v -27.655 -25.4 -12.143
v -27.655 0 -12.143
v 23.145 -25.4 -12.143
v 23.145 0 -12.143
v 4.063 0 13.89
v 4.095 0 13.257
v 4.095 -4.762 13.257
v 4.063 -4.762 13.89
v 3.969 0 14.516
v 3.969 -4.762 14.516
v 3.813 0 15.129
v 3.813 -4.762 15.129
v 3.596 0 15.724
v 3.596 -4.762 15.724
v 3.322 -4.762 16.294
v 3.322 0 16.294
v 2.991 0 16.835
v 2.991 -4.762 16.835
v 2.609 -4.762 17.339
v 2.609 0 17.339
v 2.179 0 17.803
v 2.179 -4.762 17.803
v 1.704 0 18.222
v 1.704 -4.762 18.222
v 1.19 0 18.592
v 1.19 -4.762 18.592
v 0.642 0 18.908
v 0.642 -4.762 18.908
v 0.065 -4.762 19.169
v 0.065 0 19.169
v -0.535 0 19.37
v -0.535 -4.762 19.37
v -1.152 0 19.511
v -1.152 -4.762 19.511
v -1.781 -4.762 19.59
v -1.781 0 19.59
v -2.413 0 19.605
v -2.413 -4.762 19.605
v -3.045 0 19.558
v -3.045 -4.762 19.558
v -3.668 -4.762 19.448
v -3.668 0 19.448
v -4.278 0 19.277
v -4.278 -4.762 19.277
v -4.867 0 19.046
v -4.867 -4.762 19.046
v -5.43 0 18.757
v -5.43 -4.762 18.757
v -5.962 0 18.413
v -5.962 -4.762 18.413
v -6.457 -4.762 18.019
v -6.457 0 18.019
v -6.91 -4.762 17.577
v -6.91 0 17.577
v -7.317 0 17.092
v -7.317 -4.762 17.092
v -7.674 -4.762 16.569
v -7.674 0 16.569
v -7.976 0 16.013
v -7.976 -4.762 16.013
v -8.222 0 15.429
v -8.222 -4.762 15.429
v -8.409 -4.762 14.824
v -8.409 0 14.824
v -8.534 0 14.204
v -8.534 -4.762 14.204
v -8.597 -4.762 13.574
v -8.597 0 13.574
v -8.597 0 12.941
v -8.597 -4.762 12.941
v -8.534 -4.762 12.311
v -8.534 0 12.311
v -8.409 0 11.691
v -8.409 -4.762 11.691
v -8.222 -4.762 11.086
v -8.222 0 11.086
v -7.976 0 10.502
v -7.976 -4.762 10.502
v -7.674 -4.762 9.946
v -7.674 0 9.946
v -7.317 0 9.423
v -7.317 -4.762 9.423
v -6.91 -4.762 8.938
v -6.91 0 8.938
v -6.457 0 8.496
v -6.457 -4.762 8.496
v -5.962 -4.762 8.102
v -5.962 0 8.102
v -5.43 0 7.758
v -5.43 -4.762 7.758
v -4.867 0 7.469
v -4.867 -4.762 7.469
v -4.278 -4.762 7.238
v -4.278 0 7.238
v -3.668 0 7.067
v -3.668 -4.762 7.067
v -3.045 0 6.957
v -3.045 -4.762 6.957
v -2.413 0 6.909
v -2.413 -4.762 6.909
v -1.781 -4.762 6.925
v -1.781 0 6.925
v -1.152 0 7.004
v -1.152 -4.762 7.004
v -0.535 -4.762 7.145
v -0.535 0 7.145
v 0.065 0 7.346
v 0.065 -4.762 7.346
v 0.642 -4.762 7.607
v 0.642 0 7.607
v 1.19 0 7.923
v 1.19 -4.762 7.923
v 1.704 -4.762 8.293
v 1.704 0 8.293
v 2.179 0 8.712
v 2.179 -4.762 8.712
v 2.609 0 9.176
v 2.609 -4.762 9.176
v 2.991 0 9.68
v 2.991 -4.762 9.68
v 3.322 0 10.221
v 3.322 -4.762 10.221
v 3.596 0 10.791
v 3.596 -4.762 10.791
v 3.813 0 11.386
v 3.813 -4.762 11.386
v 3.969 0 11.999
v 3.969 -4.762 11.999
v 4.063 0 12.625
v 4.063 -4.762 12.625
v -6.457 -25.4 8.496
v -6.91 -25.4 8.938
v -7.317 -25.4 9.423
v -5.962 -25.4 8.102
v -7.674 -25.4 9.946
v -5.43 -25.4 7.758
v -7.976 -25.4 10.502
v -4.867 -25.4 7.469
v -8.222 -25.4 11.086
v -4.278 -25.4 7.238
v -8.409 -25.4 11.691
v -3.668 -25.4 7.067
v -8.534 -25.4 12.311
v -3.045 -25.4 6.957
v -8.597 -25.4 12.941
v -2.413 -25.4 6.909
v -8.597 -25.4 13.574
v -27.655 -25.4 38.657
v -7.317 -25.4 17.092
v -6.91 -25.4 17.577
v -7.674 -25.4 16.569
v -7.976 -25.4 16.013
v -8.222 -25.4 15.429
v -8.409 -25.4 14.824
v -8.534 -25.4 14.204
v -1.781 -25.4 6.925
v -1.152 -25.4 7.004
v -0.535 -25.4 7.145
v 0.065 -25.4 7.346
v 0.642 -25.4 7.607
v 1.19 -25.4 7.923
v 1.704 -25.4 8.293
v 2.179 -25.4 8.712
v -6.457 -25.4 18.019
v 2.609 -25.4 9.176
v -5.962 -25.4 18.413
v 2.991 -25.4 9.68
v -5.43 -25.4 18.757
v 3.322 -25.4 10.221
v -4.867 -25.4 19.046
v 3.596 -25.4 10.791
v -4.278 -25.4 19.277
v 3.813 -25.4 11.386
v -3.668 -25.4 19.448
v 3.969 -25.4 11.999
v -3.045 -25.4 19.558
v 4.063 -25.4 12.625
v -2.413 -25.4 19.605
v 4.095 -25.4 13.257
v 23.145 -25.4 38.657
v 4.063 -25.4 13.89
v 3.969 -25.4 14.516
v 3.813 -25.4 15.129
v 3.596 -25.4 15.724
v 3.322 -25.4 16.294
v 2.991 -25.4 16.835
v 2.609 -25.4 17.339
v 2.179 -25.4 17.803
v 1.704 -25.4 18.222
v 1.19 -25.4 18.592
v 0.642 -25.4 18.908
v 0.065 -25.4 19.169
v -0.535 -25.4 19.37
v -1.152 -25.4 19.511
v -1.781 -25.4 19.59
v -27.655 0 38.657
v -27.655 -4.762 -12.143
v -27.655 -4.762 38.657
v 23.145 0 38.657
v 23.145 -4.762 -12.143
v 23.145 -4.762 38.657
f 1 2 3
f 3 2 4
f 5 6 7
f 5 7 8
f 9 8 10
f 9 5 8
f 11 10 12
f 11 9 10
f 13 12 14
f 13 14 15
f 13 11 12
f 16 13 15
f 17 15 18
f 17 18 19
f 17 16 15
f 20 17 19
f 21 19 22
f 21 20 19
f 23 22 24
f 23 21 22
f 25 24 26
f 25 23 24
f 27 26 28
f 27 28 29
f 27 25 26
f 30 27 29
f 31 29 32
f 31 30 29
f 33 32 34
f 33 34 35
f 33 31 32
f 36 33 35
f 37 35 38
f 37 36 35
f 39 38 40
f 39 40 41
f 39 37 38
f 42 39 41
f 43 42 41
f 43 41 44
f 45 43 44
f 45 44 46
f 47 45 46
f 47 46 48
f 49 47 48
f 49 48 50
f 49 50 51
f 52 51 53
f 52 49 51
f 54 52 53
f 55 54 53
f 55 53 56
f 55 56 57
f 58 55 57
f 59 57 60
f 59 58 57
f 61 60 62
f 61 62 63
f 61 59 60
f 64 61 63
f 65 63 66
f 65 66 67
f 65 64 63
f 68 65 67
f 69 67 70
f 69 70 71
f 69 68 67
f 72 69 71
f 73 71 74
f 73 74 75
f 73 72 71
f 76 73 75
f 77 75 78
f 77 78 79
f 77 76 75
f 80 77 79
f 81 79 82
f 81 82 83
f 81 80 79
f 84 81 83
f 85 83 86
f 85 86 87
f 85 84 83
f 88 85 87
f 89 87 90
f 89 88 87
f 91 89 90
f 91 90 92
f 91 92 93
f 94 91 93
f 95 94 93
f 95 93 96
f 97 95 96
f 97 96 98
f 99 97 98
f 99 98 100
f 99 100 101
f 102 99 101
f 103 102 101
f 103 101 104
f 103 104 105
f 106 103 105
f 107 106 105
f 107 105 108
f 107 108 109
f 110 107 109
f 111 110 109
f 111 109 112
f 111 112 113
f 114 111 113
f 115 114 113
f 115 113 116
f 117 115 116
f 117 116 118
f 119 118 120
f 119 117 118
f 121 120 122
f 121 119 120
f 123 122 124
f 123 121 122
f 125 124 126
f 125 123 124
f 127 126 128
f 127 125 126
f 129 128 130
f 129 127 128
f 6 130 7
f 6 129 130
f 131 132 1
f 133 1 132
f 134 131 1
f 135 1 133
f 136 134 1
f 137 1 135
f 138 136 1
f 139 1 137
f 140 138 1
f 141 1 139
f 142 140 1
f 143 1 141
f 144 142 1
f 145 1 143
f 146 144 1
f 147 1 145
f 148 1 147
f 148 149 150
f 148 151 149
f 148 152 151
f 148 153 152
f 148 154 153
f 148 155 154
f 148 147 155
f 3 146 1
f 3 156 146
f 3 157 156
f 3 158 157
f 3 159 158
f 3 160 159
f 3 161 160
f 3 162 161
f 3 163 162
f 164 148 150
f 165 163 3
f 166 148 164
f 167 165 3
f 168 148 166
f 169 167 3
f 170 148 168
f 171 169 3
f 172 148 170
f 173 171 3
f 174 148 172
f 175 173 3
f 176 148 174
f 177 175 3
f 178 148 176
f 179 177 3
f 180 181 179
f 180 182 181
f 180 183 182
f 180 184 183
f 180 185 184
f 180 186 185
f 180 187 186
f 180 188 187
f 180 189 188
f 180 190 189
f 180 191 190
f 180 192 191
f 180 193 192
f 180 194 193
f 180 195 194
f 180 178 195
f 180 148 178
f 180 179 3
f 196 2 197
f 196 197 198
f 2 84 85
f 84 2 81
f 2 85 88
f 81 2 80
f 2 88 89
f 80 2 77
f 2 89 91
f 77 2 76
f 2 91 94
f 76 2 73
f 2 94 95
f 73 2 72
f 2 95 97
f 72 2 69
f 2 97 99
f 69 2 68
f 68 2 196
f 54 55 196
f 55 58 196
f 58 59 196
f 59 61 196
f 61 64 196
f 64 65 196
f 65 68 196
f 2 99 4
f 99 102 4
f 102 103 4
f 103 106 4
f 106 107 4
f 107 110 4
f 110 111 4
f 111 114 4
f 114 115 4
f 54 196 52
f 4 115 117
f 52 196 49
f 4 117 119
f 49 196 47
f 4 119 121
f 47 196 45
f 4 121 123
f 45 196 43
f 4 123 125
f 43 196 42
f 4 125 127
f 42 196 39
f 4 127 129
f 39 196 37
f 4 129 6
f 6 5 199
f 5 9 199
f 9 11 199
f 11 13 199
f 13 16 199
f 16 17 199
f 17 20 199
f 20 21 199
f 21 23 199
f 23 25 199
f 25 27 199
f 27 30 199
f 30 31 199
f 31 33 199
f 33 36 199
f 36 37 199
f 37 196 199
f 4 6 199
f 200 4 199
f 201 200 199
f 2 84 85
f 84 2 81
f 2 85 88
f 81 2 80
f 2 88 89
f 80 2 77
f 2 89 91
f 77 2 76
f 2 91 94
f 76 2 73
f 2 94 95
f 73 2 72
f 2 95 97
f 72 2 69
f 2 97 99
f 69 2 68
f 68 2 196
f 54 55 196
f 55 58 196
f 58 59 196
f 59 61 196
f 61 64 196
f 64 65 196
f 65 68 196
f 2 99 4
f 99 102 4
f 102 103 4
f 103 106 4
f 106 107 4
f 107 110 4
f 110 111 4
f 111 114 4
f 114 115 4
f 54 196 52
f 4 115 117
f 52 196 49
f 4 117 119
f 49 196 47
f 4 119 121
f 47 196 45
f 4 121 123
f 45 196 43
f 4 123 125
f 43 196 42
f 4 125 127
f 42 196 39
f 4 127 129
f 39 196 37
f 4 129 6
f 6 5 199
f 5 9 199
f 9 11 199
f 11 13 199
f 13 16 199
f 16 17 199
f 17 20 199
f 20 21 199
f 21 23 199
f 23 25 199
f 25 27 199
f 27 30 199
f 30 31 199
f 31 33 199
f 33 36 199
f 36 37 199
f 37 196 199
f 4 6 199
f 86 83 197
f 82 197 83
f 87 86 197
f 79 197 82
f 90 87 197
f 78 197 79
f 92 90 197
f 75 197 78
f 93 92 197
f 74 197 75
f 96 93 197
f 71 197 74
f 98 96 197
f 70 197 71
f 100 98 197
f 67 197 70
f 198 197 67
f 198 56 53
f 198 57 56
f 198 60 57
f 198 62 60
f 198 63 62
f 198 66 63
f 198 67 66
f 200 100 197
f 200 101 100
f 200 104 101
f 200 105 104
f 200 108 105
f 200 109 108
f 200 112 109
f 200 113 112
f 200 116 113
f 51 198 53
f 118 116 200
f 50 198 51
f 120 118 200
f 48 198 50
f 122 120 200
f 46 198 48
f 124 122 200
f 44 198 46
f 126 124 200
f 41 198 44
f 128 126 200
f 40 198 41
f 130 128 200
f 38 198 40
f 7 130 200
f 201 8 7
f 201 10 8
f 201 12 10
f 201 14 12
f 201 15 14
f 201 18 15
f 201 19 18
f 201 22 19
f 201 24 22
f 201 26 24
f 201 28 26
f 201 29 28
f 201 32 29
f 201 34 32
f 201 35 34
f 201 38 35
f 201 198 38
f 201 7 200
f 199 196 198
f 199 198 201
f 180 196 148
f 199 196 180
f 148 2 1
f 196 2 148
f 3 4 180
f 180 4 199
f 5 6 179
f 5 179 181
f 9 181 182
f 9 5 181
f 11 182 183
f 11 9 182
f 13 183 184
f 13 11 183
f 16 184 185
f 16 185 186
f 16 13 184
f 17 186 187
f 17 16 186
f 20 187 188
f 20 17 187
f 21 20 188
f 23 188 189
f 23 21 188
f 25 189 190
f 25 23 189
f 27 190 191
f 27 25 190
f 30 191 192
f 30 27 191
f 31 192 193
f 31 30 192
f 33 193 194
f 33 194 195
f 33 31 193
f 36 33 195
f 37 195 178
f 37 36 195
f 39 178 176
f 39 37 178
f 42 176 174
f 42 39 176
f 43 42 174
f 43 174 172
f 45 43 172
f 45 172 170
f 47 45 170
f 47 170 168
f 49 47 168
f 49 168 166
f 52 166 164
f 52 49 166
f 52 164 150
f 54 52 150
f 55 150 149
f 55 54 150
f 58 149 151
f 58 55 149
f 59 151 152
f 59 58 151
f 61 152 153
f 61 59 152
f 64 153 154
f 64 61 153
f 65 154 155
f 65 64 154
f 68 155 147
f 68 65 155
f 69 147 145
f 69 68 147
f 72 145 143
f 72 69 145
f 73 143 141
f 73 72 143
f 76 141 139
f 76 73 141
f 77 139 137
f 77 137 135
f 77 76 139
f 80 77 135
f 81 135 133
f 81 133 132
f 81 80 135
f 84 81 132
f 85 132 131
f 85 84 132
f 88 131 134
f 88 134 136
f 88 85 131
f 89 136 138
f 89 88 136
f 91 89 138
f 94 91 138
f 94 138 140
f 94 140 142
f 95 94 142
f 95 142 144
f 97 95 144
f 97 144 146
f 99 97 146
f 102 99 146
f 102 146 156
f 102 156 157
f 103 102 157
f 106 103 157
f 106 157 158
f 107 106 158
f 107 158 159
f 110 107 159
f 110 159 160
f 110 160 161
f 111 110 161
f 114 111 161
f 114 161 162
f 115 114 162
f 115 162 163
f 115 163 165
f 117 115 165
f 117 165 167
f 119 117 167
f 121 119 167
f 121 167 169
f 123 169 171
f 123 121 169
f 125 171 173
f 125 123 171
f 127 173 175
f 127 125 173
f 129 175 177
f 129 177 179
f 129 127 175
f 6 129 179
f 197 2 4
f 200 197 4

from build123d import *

# Parameters (mm, degrees)
F0_W     = 50.8
F0_H     = 50.8
F0_R     = 6.35
F1_DEPTH = 4.7625
F2_DEPTH = 25.4


with BuildPart() as f1:
    # F0 (on Front) → F1 (new body)
    with BuildSketch(Plane.XZ):
        with Locations((-2.255159, 13.25747)):
            Rectangle(F0_W, F0_H)
        with Locations((-2.255159, 13.25747)):
            Circle(F0_R, mode=Mode.SUBTRACT)
    extrude(amount=F1_DEPTH)


with BuildPart() as f2:
    # F0 (on Front) → F2 (new body)
    with BuildSketch(Plane.XZ):
        with Locations((-2.255159, 13.25747)):
            Rectangle(F0_W, F0_H)
        with Locations((-2.255159, 13.25747)):
            Circle(F0_R, mode=Mode.SUBTRACT)
    extrude(amount=F2_DEPTH)


solid = Compound([f1.part, f2.part])
